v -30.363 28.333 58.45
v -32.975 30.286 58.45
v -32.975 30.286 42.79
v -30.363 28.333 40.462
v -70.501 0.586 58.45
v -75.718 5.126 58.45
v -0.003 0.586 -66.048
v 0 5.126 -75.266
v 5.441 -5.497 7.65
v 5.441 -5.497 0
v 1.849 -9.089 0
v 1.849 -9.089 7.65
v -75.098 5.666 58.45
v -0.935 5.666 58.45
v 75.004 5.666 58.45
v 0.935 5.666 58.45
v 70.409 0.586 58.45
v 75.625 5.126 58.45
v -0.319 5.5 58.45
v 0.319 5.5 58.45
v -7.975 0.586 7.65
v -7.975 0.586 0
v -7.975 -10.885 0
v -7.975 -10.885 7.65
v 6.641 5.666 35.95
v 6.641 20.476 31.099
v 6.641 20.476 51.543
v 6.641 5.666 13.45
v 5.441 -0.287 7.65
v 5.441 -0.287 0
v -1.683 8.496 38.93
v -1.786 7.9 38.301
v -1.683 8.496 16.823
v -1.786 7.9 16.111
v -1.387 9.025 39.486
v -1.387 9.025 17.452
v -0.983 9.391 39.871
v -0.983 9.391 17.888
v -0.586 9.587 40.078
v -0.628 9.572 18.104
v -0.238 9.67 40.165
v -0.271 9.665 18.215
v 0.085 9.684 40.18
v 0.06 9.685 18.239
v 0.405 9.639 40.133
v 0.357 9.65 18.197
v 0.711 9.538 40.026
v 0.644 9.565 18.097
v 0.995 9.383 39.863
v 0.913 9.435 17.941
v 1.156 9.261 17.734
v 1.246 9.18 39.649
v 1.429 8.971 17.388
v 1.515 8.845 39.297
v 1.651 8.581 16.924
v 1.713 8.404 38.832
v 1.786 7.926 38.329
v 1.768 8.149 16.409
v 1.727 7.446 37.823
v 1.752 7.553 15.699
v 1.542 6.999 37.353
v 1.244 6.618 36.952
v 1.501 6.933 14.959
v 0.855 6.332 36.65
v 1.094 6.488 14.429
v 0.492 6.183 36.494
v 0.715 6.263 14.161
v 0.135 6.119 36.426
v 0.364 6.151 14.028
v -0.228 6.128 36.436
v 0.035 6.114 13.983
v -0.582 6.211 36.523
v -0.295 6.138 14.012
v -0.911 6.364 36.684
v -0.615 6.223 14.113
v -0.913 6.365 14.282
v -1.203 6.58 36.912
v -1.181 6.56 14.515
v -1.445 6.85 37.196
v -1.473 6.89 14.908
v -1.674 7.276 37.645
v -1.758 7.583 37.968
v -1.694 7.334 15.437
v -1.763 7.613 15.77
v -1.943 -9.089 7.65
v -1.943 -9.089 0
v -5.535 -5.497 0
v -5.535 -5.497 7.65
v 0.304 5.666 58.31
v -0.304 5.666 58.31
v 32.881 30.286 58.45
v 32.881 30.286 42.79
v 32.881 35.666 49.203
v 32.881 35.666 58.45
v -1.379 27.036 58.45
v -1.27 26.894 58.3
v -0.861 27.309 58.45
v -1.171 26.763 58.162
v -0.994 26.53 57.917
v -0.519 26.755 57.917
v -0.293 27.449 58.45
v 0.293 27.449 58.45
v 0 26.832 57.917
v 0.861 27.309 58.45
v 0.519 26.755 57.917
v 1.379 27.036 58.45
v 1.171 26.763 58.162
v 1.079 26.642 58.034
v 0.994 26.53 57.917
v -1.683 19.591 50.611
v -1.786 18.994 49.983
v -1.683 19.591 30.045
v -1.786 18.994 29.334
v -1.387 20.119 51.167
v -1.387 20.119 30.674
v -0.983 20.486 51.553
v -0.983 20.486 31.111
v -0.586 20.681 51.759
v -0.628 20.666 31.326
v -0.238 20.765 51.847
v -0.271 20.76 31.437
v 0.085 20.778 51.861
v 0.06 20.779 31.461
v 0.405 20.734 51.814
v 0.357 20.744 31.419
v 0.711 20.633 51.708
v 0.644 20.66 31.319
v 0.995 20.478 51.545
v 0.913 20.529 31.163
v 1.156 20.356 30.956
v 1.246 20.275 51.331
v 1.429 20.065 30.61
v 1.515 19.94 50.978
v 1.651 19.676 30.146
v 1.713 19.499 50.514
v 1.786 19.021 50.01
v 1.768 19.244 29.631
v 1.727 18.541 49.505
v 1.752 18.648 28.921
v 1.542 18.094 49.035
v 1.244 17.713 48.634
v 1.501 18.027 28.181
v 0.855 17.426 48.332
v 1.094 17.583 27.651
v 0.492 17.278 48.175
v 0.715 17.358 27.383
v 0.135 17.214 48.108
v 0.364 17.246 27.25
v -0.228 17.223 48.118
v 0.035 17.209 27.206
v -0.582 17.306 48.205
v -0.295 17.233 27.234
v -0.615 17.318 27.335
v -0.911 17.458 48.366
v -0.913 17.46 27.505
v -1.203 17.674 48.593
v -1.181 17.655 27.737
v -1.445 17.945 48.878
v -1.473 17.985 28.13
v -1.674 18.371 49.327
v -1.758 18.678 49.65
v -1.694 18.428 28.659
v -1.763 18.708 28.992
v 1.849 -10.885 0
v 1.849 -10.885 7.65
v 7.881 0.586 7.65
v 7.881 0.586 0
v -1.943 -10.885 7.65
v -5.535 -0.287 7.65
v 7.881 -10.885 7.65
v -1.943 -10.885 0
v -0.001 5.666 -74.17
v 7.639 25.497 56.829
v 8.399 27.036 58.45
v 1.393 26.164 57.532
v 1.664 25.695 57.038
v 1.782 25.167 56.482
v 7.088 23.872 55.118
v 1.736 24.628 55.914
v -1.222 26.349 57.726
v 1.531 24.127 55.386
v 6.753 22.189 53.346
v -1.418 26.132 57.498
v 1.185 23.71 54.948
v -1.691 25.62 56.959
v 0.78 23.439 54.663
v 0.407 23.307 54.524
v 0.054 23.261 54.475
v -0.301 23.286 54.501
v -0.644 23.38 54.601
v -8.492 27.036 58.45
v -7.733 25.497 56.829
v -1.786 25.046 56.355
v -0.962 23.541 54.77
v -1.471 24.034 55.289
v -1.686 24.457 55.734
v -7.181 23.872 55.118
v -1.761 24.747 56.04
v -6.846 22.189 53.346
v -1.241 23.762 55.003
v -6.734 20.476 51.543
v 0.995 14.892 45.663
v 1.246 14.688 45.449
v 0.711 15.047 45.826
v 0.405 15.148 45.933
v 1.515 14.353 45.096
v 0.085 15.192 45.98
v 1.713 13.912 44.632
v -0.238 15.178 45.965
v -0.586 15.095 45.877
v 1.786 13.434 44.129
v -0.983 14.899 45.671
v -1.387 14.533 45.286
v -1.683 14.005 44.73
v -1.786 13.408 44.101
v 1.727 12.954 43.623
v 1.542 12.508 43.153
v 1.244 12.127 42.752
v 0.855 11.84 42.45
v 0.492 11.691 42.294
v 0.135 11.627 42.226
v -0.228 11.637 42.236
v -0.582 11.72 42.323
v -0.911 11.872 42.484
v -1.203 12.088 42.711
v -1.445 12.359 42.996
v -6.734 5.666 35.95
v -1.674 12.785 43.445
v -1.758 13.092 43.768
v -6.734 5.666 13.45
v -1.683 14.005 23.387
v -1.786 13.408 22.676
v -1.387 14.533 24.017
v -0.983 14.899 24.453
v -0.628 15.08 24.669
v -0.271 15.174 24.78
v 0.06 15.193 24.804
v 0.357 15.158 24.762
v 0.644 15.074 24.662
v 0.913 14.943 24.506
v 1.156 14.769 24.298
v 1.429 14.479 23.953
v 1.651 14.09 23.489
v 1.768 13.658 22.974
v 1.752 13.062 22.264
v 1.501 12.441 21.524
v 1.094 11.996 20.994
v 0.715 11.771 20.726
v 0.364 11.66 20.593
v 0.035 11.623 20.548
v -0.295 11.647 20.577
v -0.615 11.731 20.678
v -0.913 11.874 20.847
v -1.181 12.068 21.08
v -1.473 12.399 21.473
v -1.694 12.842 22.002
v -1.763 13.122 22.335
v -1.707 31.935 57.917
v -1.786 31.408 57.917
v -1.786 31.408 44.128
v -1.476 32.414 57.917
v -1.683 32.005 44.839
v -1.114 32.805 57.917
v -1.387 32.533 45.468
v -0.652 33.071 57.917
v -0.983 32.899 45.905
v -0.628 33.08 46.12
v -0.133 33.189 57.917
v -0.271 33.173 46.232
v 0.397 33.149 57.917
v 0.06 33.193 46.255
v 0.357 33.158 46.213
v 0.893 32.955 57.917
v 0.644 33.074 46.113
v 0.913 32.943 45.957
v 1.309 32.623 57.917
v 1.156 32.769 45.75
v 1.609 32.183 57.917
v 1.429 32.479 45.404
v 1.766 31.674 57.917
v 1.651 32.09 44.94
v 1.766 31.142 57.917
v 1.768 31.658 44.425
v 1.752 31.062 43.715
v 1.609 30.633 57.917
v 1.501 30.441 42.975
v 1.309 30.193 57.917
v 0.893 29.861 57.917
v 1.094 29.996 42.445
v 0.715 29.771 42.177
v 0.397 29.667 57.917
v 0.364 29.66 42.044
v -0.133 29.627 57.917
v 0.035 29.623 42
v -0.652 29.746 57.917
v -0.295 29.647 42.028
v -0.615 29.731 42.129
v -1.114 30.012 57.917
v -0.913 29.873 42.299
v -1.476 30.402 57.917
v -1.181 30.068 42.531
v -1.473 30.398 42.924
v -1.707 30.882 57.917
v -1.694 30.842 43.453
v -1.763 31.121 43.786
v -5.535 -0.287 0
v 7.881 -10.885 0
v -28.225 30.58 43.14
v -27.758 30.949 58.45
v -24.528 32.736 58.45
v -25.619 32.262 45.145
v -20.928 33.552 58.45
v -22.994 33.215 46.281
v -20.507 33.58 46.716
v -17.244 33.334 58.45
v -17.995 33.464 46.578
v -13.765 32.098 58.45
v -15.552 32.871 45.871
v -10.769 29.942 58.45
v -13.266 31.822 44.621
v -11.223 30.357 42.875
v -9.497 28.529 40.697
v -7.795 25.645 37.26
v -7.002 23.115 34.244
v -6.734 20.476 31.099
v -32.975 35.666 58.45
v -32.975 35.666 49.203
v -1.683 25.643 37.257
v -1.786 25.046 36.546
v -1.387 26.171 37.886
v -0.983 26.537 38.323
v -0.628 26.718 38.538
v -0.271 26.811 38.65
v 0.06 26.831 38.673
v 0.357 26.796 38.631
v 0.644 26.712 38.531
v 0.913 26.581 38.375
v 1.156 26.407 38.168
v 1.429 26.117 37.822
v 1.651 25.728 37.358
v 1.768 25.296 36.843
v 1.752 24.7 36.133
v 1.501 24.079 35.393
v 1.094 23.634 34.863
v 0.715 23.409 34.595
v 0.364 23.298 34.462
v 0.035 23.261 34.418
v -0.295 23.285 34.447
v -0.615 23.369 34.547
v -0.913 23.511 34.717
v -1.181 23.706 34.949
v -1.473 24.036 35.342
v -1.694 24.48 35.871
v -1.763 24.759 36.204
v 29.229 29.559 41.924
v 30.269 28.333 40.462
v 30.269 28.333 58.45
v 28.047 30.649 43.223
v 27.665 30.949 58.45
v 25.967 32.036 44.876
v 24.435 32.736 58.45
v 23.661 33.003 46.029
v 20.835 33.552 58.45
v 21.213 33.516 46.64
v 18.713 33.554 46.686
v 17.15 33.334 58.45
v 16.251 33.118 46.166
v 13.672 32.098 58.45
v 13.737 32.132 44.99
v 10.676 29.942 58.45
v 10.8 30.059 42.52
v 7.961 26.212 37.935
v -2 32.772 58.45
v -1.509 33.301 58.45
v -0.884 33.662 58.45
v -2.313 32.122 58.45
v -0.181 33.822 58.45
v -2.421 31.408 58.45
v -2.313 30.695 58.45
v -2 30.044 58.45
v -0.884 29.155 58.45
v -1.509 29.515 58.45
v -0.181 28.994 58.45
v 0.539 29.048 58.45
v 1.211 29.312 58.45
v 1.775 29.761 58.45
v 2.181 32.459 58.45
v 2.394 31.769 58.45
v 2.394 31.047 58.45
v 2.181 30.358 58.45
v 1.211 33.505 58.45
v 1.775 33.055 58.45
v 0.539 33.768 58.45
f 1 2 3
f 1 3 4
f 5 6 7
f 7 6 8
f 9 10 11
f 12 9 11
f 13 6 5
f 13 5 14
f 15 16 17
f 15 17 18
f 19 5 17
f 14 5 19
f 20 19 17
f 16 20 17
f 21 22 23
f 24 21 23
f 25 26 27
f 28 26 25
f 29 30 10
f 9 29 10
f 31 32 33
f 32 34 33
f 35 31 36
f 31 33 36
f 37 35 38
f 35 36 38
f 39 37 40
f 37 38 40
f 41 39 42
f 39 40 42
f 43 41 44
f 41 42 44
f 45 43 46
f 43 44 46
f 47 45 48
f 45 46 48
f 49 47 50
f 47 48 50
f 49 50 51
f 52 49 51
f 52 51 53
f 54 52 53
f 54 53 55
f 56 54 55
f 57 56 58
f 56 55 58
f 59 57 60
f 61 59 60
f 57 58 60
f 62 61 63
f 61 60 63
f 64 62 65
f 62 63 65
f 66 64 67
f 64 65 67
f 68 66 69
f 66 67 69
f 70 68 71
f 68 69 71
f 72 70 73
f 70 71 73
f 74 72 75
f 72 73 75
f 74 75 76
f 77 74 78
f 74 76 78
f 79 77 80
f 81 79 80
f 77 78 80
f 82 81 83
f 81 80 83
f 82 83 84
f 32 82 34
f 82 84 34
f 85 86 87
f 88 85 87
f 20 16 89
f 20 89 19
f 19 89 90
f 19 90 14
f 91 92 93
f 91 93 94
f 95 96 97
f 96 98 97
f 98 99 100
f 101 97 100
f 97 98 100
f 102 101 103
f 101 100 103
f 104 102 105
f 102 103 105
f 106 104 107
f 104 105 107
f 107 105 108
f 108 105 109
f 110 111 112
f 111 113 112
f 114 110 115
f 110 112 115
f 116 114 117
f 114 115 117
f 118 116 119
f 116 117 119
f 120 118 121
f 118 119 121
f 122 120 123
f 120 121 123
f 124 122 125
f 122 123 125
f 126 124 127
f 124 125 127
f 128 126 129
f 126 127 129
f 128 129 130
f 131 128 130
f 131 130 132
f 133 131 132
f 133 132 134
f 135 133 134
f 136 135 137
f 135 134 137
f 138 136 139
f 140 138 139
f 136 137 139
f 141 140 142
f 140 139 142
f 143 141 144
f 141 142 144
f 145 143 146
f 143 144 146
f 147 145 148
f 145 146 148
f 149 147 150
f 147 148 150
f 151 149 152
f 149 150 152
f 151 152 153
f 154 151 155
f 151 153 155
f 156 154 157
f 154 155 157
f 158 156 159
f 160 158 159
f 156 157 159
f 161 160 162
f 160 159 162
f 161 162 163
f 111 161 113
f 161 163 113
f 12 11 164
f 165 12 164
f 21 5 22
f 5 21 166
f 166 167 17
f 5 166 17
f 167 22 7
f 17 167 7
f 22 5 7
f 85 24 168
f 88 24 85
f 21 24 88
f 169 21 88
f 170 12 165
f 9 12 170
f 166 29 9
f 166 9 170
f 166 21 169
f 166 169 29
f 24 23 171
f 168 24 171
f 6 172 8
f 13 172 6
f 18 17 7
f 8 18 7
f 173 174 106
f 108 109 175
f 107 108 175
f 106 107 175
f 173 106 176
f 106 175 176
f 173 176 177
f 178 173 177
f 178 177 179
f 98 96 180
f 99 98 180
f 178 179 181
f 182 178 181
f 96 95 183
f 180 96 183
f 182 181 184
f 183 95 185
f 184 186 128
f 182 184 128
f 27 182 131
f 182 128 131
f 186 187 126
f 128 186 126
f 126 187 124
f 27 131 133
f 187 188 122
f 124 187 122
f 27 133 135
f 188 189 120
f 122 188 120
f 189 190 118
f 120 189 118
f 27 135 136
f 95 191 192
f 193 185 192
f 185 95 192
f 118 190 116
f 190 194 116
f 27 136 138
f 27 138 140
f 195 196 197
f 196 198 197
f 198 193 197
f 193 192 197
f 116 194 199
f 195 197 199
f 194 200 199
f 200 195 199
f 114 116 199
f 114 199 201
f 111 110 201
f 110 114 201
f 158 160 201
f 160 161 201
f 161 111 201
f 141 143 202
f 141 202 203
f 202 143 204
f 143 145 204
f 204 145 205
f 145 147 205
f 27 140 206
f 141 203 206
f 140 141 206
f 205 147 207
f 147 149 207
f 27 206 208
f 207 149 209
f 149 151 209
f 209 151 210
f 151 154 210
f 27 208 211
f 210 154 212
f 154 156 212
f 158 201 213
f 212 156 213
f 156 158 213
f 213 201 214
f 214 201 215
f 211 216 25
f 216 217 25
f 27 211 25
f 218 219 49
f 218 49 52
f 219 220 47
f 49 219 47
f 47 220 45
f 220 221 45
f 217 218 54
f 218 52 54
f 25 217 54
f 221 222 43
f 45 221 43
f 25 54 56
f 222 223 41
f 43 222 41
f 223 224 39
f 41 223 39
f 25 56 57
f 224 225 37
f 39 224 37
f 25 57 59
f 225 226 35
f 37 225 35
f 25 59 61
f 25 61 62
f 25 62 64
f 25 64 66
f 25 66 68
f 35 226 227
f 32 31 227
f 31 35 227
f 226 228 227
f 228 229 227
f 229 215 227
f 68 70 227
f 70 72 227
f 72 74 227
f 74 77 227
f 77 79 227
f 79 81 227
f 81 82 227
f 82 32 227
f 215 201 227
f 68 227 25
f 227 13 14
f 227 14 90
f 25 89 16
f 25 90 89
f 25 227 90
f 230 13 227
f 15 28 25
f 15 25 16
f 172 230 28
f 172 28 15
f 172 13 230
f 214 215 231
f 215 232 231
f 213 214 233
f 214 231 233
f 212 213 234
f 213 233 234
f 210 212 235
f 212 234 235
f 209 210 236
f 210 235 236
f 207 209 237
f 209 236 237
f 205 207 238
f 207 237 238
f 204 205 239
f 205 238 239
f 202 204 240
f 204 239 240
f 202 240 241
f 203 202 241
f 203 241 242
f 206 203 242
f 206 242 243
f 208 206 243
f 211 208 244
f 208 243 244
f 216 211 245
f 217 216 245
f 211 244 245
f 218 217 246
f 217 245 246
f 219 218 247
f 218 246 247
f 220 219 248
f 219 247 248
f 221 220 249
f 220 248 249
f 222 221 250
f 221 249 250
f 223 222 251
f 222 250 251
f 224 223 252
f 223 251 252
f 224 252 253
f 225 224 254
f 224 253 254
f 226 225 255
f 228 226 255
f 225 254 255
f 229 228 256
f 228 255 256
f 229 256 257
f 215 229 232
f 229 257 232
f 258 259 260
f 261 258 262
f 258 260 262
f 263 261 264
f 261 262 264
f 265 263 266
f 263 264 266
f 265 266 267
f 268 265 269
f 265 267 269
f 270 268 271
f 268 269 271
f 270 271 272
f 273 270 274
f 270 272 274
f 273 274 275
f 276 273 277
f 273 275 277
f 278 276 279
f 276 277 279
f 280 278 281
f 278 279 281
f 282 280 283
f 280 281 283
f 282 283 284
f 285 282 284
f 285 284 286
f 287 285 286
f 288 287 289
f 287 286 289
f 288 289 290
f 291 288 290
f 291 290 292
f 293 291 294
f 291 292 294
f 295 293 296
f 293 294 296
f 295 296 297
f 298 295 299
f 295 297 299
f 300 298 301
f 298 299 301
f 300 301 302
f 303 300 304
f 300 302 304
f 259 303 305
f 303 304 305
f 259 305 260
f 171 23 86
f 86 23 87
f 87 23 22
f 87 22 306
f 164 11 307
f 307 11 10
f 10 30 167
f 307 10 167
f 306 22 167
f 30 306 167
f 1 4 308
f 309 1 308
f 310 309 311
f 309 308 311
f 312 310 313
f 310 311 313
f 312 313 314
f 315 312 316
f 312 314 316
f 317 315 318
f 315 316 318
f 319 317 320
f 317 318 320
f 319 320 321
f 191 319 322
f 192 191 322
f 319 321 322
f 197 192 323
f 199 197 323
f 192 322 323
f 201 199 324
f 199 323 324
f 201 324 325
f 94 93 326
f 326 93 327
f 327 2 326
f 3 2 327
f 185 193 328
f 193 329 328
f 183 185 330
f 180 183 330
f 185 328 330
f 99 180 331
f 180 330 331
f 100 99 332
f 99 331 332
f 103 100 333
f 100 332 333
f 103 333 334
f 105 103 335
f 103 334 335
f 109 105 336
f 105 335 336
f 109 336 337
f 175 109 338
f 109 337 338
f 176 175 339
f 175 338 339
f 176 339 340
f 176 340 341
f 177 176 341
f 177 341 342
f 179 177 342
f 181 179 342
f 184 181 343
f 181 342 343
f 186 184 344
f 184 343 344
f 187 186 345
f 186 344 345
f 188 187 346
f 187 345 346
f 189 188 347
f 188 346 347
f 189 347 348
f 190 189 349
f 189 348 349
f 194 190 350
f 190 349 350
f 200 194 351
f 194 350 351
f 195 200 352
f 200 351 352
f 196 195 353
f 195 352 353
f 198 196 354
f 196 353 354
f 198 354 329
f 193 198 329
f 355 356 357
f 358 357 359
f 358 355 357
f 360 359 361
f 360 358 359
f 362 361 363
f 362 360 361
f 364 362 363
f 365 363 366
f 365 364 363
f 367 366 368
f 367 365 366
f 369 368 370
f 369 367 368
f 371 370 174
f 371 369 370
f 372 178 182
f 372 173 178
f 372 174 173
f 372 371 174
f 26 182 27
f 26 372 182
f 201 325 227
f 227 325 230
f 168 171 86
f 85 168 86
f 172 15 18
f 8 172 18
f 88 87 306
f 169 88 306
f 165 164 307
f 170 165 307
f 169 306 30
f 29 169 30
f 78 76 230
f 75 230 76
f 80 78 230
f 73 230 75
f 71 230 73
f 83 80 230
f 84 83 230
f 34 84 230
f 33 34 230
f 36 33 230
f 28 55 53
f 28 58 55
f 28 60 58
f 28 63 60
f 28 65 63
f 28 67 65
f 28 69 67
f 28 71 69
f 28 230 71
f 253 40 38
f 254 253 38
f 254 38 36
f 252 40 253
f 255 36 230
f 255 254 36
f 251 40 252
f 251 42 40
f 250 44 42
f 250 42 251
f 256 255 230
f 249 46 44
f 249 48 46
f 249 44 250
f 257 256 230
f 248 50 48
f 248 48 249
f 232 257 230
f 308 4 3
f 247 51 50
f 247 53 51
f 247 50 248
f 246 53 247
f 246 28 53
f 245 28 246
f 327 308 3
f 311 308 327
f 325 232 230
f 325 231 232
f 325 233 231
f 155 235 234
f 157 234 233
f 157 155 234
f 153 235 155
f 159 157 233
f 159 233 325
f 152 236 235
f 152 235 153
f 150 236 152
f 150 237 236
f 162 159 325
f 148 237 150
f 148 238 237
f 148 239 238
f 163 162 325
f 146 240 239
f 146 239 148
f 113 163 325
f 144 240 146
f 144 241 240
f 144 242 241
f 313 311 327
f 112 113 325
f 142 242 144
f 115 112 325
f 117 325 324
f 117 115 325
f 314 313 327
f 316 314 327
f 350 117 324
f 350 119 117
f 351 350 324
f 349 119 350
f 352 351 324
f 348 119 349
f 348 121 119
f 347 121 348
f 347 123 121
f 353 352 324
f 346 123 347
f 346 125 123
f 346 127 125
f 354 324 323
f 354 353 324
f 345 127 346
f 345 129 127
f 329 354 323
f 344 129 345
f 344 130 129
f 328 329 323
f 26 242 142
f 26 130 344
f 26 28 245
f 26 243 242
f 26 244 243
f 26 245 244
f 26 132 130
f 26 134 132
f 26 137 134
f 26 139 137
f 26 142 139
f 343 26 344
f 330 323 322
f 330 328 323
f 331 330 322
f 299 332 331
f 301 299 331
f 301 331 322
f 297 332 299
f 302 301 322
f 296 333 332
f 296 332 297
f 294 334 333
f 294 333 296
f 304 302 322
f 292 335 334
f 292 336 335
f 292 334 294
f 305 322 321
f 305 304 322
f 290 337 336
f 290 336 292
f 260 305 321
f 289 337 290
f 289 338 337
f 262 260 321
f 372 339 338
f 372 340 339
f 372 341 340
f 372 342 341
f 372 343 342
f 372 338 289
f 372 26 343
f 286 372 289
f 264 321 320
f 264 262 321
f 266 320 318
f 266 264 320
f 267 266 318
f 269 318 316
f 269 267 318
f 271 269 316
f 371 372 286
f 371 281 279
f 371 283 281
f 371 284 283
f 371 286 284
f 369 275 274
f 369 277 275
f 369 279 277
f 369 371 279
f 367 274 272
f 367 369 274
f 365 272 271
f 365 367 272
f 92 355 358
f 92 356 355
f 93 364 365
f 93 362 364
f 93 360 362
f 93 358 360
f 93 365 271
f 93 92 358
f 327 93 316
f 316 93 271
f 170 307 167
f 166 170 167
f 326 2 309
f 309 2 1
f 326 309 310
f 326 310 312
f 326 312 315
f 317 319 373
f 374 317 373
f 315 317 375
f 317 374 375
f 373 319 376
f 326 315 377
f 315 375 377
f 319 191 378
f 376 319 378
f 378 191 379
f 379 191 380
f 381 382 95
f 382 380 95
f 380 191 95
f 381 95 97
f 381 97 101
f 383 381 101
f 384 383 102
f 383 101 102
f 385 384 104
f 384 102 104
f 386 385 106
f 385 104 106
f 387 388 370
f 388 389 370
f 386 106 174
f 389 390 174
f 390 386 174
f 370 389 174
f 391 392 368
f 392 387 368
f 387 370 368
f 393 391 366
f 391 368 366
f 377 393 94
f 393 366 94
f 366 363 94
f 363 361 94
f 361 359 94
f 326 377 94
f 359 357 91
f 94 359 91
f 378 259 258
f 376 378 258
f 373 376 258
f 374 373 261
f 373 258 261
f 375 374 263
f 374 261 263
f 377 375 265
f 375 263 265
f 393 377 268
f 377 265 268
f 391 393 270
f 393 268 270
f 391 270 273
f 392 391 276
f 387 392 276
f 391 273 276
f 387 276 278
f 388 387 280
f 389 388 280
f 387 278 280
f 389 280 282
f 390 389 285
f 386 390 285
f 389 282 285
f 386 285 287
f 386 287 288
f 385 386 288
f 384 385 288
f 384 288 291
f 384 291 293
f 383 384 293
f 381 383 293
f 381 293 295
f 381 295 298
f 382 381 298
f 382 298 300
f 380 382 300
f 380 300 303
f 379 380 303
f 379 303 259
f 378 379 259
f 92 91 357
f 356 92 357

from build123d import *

# Parameters (mm, degrees)
BOSS_EXTRUDE1_DEPTH                       = 7.65
BOSS_EXTRUDE2_DEPTH                       = 5.08
CHAMFER1_SIZE                             = 1
CHAMFER2_SIZE                             = 1
CHAMFER3_SIZE                             = 5
CHAMFER4_SIZE                             = 5
BOSS_EXTRUDE3_DEPTH                       = 30
CUT_EXTRUDE1_DEPTH                        = 45.08
CUT_EXTRUDE3_DEPTH                        = 45.08
CUT_EXTRUDE4_DEPTH                        = 118.13273671
CUT_EXTRUDE4_DEPTH_BACK                   = 118.13273671
F_9_64_0_14063_DIAMETER_HOLE1_D           = 3.572002
F_9_64_0_14063_DIAMETER_HOLE1_CSINK_D     = 4.842002
F_9_64_0_14063_DIAMETER_HOLE1_CSINK_ANGLE = 100
CUT_EXTRUDE5_DEPTH                        = 118.132626096
CUT_EXTRUDE5_DEPTH_BACK                   = 118.132626096


with BuildPart() as part:
    # Sketch2 → Boss-Extrude1 (new body)
    with BuildSketch(Plane.XY):
        Polygon((-7.97490293, 0.58645445), (-7.97490293, -10.885302369), (-1.942800482, -10.885302369), (-1.942800482, -9.089251145), (-5.53490293, -5.497148696), (-5.53490293, -0.387148696), (-5.53490293, -0.287148696), (5.441404415, -0.287148696), (5.441404415, -0.387148696), (5.441404415, -5.497148696), (1.849301966, -9.089251145), (1.849301966, -10.885302369), (7.881404415, -10.885302369), (7.881404415, 0.58645445), align=None)
    extrude(amount=BOSS_EXTRUDE1_DEPTH)

    # Sketch3 → Boss-Extrude2 (add)
    with BuildSketch(Plane(origin=(0, 0.58645445, 0), x_dir=(1, 0, 0), z_dir=(0, 1, 0))):
        Polygon((-0.046749258, -58.45), (76.153250742, -58.45), (0, 76.2), (-76.246749258, -58.45), align=None)
    extrude(amount=BOSS_EXTRUDE2_DEPTH)

    # Chamfer1
    chamfer1_edges = [part.edges().sort_by_distance(p)[0] for p in [
        (38.076625371, 5.66645445, -8.875),
    ]]
    chamfer(chamfer1_edges, length=CHAMFER1_SIZE)

    # Chamfer2
    chamfer2_edges = [part.edges().sort_by_distance(p)[0] for p in [
        (-38.410764077, 5.66645445, -8.367476866),
    ]]
    chamfer(chamfer2_edges, length=CHAMFER2_SIZE)

    # Chamfer3
    # the kernel refuses this chamfer: 5 mm, written as the material it takes off along each edge
    with BuildSketch(Plane(origin=(6.335905635, 0.58645445, -87.389063167), x_dir=(-0.023926207208635007, 0.9996219169112968, -0.013548425709062981), z_dir=(-0.49274390851198024, 0, 0.8701743736885943))) as chamfer3_piece_1:
        Polygon((CHAMFER3_SIZE * 0.999621916911, -CHAMFER3_SIZE * 0.0274958766106), (-CHAMFER3_SIZE * 0.0274958766106, -CHAMFER3_SIZE * 0.999621916911), (0, 0), align=None)
    extrude(amount=180.455930537, mode=Mode.SUBTRACT)

    # Chamfer4
    # the kernel refuses this chamfer: 5 mm, written as the material it takes off along each edge
    with BuildSketch(Plane(origin=(82.483270671, 0.58645445, 69.642393956), x_dir=(-0.8701043132999969, -0.02749587661058631, 0.49210005156081454), z_dir=(-0.49228617663900415, 0, -0.870433409451953))) as chamfer4_piece_1:
        Polygon((CHAMFER4_SIZE * 0.999621916911, CHAMFER4_SIZE * 0.0274958766106), (-CHAMFER4_SIZE * 0.0274958766106, CHAMFER4_SIZE * 0.999621916911), (0, 0), align=None)
    extrude(amount=174.577450859, mode=Mode.SUBTRACT)

    # Sketch4 → Boss-Extrude3 (add)
    with BuildSketch(Plane(origin=(0, 5.66645445, 0), x_dir=(1, 0, 0), z_dir=(0, 1, 0))):
        Polygon((-7.97490293, -13.45), (7.881404415, -13.45), (32.881404415, -13.45), (32.881404415, -58.45), (7.881404415, -58.45), (-7.97490293, -58.45), (-32.97490293, -58.45), (-32.97490293, -13.45), align=None)
    extrude(amount=BOSS_EXTRUDE3_DEPTH)

    # Sketch5 → Cut-Extrude1 (cut)
    with BuildSketch(Plane(origin=(0, 0, 13.45), x_dir=(-1, 0, 0), z_dir=(0, 0, -1))):
        Polygon((-6.640745102, 5.66645445), (-32.881404415, 5.66645445), (-32.881404415, 30.285655528), (-6.640745102, 10.66645445), align=None)
        Polygon((6.734243618, 10.66645445), (6.734243618, 5.66645445), (32.97490293, 5.66645445), (32.97490293, 30.285655528), align=None)
    extrude(amount=-CUT_EXTRUDE1_DEPTH, mode=Mode.SUBTRACT)

    # Sketch7 → Cut-Extrude3 (cut)
    with BuildSketch(Plane(origin=(0, 0, 13.45), x_dir=(-1, 0, 0), z_dir=(0, 0, -1))):
        with BuildLine():
            Line((-6.640745102, 20.476054989), (-6.640745102, 10.66645445))
            Line((-6.640745102, 10.66645445), (-11.048165512, 10.66645445))
            ThreePointArc((-11.048165512, 10.66645445), (-31.728933629, 25.853173581), (-6.640745102, 20.476054989))
        make_face()
        with BuildLine():
            Line((6.734243618, 20.476054989), (6.734243618, 10.66645445))
            Line((6.734243618, 10.66645445), (11.141664027, 10.66645445))
            ThreePointArc((11.141664027, 10.66645445), (31.822432144, 25.853173581), (6.734243618, 20.476054989))
        make_face()
    extrude(amount=-CUT_EXTRUDE3_DEPTH, mode=Mode.SUBTRACT)

    # Sketch9 → Cut-Extrude4 (cut, two sides: drawn at the far end of the back side and taken through both)
    with BuildSketch(Plane.ZY.offset(6.734243618).offset(-CUT_EXTRUDE4_DEPTH_BACK)):
        Polygon((13.45, 5.66645445), (49.202607778, 35.66645445), (13.45, 35.66645445), align=None)
    extrude(amount=CUT_EXTRUDE4_DEPTH + CUT_EXTRUDE4_DEPTH_BACK, mode=Mode.SUBTRACT)

    # 9/64 (0.14063) Diameter Hole1 (through all)
    with Locations(Plane.XY.offset(58.45)):
        with Locations((0, 31.40818219), (0, 25.046150321), (0, 18.994461471), (0, 13.408287148), (0, 7.899698579)):
            CounterSinkHole(F_9_64_0_14063_DIAMETER_HOLE1_D / 2, F_9_64_0_14063_DIAMETER_HOLE1_CSINK_D / 2, counter_sink_angle=F_9_64_0_14063_DIAMETER_HOLE1_CSINK_ANGLE)

    # Sketch13 → Cut-Extrude5 (cut, two sides: drawn at the far end of the back side and taken through both)
    with BuildSketch(Plane(origin=(6.640745102, 0, 0), x_dir=(0, 0, -1), z_dir=(1, 0, 0)).offset(-CUT_EXTRUDE5_DEPTH_BACK)):
        Polygon((-58.45, 27.036219817), (-35.95, 5.66645445), (-58.45, 5.66645445), align=None)
    extrude(amount=CUT_EXTRUDE5_DEPTH + CUT_EXTRUDE5_DEPTH_BACK, mode=Mode.SUBTRACT)


solid = part.part
